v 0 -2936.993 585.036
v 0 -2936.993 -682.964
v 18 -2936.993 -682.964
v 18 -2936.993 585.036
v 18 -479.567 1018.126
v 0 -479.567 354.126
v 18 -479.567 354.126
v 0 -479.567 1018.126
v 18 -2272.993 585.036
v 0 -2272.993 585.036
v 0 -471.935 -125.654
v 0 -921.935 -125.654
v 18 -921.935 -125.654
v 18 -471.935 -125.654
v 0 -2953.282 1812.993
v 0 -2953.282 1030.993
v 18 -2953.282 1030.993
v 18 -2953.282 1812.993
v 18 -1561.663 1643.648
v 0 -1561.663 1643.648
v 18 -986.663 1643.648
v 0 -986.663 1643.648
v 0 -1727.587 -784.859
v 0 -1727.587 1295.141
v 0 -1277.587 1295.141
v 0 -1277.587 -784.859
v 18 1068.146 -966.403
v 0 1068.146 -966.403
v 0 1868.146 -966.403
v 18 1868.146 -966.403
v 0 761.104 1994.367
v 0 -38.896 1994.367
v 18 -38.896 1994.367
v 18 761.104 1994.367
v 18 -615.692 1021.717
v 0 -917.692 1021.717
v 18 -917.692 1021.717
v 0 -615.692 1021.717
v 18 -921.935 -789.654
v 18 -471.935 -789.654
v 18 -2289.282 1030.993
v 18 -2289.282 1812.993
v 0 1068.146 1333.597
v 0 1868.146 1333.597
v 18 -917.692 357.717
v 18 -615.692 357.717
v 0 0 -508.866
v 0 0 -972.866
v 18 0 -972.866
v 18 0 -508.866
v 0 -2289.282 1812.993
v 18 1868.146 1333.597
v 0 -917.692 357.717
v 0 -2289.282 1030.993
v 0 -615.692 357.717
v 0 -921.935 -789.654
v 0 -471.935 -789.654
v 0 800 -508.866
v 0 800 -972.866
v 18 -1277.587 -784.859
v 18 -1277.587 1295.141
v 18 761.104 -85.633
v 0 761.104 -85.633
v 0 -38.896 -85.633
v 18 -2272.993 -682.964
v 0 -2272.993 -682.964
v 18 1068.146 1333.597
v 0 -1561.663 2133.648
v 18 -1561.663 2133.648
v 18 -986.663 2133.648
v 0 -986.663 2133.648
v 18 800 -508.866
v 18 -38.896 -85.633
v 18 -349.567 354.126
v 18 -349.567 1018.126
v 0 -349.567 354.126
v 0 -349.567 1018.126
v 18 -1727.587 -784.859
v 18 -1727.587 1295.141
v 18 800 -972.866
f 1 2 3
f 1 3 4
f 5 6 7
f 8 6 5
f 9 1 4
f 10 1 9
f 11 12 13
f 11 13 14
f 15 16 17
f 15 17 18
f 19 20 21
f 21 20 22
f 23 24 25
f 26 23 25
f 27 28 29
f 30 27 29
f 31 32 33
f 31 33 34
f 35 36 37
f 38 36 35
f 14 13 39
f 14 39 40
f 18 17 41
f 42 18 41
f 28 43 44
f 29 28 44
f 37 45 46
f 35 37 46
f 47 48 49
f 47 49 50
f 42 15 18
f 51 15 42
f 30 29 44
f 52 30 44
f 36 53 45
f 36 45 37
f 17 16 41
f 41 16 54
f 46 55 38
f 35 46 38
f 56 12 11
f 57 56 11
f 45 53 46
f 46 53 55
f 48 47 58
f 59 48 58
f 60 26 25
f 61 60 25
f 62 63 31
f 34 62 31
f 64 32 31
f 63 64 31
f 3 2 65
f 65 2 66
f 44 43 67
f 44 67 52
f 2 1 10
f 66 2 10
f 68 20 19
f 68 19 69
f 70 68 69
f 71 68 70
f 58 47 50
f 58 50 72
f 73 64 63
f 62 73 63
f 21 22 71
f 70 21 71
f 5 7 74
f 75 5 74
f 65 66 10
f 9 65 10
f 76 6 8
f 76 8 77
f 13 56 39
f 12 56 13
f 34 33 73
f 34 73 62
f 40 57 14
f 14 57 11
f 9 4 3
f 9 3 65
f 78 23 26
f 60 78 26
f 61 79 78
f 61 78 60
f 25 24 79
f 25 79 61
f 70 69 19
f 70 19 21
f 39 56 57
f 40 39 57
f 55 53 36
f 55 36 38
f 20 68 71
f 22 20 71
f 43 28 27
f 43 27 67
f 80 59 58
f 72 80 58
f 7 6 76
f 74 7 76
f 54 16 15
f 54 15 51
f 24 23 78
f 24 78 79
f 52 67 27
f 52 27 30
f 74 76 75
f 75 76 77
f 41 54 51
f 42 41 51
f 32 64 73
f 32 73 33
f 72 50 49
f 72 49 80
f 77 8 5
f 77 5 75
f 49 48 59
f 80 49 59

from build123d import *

# Parameters (mm, degrees)
F0_W     = 450
F0_H     = 2080
F1_DEPTH = 18
F0_H_2   = 664
F0_W_2   = 800
F0_H_3   = 2300
F0_W_3   = 664
F0_H_4   = 1268
F0_H_5   = 464
F0_H_6   = 782
F0_W_4   = 302
F0_W_5   = 130
F0_W_6   = 575
F0_H_7   = 490


# Not quite as in the source:
# - a feature names something its author has since deleted; it is built from what else it names


with BuildPart() as f1:
    # F0 (on Right) → F1 (new body)
    with BuildSketch(Plane.YZ):
        with Locations((-1502.587223053, 255.1411771774)):
            Rectangle(F0_W, F0_H)
    extrude(amount=F1_DEPTH)


with BuildPart() as f1b:
    # F0 (on Right) → F1, piece 2 (new body)
    with BuildSketch(Plane.YZ):
        with Locations((-696.9352006912, -457.6543741226)):
            Rectangle(F0_W, F0_H_2)
    extrude(amount=F1_DEPTH)


with BuildPart() as f1c:
    # F0 (on Right) → F1, piece 3 (new body)
    with BuildSketch(Plane.YZ):
        with Locations((361.1036155, 954.3668979353)):
            Rectangle(F0_W_2, F0_H)
    extrude(amount=F1_DEPTH)


with BuildPart() as f1d:
    # F0 (on Right) → F1, piece 4 (new body)
    with BuildSketch(Plane.YZ):
        with Locations((1468.146109581, 183.5974693298)):
            Rectangle(F0_W_2, F0_H_3)
    extrude(amount=F1_DEPTH)


with BuildPart() as f1e:
    # F0 (on Right) → F1, piece 5 (new body)
    with BuildSketch(Plane.YZ):
        with Locations((-2604.9928836823, -48.9639673233)):
            Rectangle(F0_W_3, F0_H_4)
    extrude(amount=F1_DEPTH)


with BuildPart() as f1f:
    # F0 (on Right) → F1, piece 6 (new body)
    with BuildSketch(Plane.YZ):
        with Locations((400, -740.8659391403)):
            Rectangle(F0_W_2, F0_H_5)
    extrude(amount=F1_DEPTH)


with BuildPart() as f1g:
    # F0 (on Right) → F1, piece 7 (new body)
    with BuildSketch(Plane.YZ):
        with Locations((-2621.2816410065, 1421.9926271439)):
            Rectangle(F0_W_3, F0_H_6)
    extrude(amount=F1_DEPTH)


with BuildPart() as f1h:
    # F0 (on Right) → F1, piece 8 (new body)
    with BuildSketch(Plane.YZ):
        with Locations((-766.6916480064, 689.7170372009)):
            Rectangle(F0_W_4, F0_H_2)
    extrude(amount=F1_DEPTH)


with BuildPart() as f1i:
    # F0 (on Right) → F1, piece 9 (new body)
    with BuildSketch(Plane.YZ):
        with Locations((-414.567438364, 686.1258871555)):
            Rectangle(F0_W_5, F0_H_2)
    extrude(amount=F1_DEPTH)


with BuildPart() as f1j:
    # F0 (on Right) → F1, piece 10 (new body)
    with BuildSketch(Plane.YZ):
        with Locations((-1274.1632699966, 1888.6480283737)):
            Rectangle(F0_W_6, F0_H_7)
    extrude(amount=F1_DEPTH)


solid = Compound([f1.part, f1b.part, f1c.part, f1d.part, f1e.part, f1f.part, f1g.part, f1h.part, f1i.part, f1j.part])
